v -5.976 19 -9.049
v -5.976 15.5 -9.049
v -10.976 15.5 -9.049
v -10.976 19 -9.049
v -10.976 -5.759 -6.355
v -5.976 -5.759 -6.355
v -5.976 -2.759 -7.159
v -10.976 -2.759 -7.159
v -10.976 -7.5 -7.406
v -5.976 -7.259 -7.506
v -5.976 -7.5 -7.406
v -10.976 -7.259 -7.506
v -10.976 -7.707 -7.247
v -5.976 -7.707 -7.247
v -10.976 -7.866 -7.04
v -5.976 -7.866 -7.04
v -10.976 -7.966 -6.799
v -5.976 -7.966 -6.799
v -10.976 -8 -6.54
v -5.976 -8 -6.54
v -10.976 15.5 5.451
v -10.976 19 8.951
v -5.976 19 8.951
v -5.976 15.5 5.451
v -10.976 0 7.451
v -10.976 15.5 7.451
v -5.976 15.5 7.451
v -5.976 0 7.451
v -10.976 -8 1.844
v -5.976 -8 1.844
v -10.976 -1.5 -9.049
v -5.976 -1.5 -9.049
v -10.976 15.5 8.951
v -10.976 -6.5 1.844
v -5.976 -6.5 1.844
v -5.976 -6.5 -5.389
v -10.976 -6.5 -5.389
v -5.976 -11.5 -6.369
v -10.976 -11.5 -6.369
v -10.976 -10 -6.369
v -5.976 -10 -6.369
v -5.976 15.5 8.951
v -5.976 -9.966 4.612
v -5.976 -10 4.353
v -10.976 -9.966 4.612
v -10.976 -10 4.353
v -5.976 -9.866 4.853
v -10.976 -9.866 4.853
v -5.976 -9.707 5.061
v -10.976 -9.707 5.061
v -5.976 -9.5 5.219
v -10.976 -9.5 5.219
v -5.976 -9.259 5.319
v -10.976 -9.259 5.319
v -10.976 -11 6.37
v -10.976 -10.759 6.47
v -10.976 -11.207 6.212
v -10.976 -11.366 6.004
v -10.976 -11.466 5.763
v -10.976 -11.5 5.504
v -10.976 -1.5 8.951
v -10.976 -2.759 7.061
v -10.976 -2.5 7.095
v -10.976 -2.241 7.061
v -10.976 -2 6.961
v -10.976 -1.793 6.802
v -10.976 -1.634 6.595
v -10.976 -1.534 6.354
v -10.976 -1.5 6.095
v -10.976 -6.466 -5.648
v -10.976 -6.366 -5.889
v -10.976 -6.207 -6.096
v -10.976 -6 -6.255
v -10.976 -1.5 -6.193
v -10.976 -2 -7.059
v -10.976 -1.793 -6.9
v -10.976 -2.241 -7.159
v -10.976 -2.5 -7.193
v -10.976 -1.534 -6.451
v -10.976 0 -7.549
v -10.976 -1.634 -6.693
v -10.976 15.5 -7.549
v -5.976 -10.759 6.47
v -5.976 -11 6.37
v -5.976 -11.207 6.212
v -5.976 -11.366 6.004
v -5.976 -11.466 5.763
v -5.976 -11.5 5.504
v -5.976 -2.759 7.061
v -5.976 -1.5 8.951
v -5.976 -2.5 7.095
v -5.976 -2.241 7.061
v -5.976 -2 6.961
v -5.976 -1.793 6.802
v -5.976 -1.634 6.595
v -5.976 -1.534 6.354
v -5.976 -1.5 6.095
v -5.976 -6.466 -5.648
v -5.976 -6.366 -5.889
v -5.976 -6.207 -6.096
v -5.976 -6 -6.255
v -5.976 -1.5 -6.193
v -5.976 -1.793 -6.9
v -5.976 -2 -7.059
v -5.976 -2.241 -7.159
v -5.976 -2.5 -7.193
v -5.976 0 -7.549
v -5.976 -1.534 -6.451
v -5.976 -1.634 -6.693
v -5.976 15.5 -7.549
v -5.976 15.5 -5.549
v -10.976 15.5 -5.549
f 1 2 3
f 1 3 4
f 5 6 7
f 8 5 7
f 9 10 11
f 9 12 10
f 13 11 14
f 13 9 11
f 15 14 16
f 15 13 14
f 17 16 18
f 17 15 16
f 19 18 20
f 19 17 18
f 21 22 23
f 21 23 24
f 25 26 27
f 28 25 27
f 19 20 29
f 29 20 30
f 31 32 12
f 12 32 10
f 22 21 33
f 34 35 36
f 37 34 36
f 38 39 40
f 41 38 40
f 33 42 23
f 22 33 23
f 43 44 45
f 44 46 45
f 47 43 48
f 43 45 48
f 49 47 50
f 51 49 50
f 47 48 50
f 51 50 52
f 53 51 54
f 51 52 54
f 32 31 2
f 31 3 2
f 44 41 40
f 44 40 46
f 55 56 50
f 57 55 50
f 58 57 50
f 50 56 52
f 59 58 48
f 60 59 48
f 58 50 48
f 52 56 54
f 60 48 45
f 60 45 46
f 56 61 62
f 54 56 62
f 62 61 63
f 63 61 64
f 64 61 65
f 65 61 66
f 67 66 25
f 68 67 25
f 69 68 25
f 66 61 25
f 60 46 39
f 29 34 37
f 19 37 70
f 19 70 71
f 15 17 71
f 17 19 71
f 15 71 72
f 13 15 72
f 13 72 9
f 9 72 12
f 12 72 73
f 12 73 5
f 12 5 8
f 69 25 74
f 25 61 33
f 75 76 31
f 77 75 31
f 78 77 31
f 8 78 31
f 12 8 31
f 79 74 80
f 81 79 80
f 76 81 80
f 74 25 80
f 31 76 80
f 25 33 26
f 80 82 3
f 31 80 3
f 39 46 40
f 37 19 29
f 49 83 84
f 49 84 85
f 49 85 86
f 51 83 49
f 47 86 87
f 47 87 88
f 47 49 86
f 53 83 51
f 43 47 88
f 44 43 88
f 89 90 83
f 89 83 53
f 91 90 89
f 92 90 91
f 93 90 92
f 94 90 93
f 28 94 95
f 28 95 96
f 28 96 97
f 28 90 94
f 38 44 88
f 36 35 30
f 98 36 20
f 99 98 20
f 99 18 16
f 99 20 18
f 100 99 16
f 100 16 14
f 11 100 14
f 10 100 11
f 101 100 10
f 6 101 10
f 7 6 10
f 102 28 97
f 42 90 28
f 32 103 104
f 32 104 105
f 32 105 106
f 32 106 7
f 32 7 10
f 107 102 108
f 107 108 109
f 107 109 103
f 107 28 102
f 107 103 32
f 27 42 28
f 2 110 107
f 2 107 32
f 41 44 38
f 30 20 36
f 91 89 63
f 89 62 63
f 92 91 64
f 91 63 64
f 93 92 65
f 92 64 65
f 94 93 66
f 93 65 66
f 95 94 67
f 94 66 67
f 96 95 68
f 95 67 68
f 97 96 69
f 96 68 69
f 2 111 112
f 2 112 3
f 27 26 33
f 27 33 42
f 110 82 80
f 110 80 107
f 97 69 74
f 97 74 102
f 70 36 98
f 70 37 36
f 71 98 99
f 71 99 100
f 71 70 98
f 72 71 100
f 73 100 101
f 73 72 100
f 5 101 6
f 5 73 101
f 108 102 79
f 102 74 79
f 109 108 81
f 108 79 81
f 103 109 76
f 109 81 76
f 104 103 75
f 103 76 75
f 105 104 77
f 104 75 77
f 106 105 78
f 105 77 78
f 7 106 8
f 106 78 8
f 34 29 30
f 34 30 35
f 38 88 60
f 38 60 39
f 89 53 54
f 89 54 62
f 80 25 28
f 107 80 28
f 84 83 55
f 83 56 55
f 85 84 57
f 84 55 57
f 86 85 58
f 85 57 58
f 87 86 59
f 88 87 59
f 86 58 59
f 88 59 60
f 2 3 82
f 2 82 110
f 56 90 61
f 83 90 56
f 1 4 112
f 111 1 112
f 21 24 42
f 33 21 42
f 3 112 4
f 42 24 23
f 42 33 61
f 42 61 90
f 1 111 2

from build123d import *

# Parameters (mm, degrees)
SKETCH_1_W        = 5
SKETCH_1_H        = 1.5
EXTRUDE_1_DEPTH   = 15.5
EXTRUDE_1_2_DEPTH = 15.5
SKETCH_2_W        = 5
SKETCH_2_H        = 18
EXTRUDE_2_DEPTH   = 1.5
EXTRUDE_3_DEPTH   = 5
EXTRUDE_3_2_DEPTH = 5
EXTRUDE_4_DEPTH   = 5
FILLET_1_R        = 1


with BuildPart() as part:
    # 草图1 → 凸台-拉伸1 (new body)
    with BuildSketch(Plane(origin=(0, 0, 0), x_dir=(1, 0, 0), z_dir=(0, 1, 0))):
        with Locations((-8.475609756, 8.298780488)):
            Rectangle(SKETCH_1_W, SKETCH_1_H)
    extrude(amount=EXTRUDE_1_DEPTH)



with BuildPart() as body_2:
    # 草图1 → Extrude 1 2 (new body)
    with BuildSketch(Plane(origin=(0, 0, 0), x_dir=(1, 0, 0), z_dir=(0, 1, 0))):
        with Locations((-8.475609756, -8.201219512)):
            Rectangle(SKETCH_1_W, SKETCH_1_H)
    extrude(amount=EXTRUDE_1_2_DEPTH)


with BuildPart() as part_1:
    add(part.part)

    add(body_2.part)  # 凸台-拉伸2 merges body 2
    # 草图2 → 凸台-拉伸2 (add)
    with BuildSketch(Plane.XZ):
        with Locations((-8.475609756, -0.048780488)):
            Rectangle(SKETCH_2_W, SKETCH_2_H)
    extrude(amount=EXTRUDE_2_DEPTH)

    # 草图4 → 凸台-拉伸4 (add)
    with BuildSketch(Plane(origin=(-5.975609756, 0, 0), x_dir=(0, 0, -1), z_dir=(1, 0, 0))):
        Polygon((-8.951219512, -1.5), (-6.271727588, -11.5), (6.369288563, -11.5), (6.369288563, -10), (-5.120737106, -10), (-7.398305242, -1.5), align=None)
        Polygon((9.048780488, -1.5), (7.307110737, -8), (-1.843879745, -8), (-1.843879745, -6.5), (6.156120255, -6.5), (7.495866217, -1.5), align=None)
    extrude(amount=-EXTRUDE_4_DEPTH)

    # 圆角1
    fillet_1_edges = [part_1.edges().sort_by_distance(p)[0] for p in [
        (-8.475609756, -1.5, 7.398305242),
        (-8.475609756, -10, 5.120737106),
        (-8.475609756, -11.5, 6.271727588),
        (-8.475609756, -1.5, -7.495866217),
        (-8.475609756, -8, -7.307110737),
        (-8.475609756, -6.5, -6.156120255),
    ]]
    fillet(fillet_1_edges, radius=FILLET_1_R)


with BuildPart() as body_2_2:
    # 草图3 → 凸台-拉伸3 (new body)
    with BuildSketch(Plane(origin=(-5.975609756, 0, 0), x_dir=(0, 0, -1), z_dir=(1, 0, 0))):
        Polygon((9.048780488, 15.5), (9.048780488, 19), (5.548780488, 15.5), align=None)
    extrude(amount=-EXTRUDE_3_DEPTH)


with BuildPart() as body_3:
    # 草图3 → Extrude 3 2 (new body)
    with BuildSketch(Plane(origin=(-5.975609756, 0, 0), x_dir=(0, 0, -1), z_dir=(1, 0, 0))):
        Polygon((-8.951219512, 15.5), (-8.951219512, 19), (-5.451219512, 15.5), align=None)
    extrude(amount=-EXTRUDE_3_2_DEPTH)


solid = Compound([part_1.part, body_2_2.part, body_3.part])
